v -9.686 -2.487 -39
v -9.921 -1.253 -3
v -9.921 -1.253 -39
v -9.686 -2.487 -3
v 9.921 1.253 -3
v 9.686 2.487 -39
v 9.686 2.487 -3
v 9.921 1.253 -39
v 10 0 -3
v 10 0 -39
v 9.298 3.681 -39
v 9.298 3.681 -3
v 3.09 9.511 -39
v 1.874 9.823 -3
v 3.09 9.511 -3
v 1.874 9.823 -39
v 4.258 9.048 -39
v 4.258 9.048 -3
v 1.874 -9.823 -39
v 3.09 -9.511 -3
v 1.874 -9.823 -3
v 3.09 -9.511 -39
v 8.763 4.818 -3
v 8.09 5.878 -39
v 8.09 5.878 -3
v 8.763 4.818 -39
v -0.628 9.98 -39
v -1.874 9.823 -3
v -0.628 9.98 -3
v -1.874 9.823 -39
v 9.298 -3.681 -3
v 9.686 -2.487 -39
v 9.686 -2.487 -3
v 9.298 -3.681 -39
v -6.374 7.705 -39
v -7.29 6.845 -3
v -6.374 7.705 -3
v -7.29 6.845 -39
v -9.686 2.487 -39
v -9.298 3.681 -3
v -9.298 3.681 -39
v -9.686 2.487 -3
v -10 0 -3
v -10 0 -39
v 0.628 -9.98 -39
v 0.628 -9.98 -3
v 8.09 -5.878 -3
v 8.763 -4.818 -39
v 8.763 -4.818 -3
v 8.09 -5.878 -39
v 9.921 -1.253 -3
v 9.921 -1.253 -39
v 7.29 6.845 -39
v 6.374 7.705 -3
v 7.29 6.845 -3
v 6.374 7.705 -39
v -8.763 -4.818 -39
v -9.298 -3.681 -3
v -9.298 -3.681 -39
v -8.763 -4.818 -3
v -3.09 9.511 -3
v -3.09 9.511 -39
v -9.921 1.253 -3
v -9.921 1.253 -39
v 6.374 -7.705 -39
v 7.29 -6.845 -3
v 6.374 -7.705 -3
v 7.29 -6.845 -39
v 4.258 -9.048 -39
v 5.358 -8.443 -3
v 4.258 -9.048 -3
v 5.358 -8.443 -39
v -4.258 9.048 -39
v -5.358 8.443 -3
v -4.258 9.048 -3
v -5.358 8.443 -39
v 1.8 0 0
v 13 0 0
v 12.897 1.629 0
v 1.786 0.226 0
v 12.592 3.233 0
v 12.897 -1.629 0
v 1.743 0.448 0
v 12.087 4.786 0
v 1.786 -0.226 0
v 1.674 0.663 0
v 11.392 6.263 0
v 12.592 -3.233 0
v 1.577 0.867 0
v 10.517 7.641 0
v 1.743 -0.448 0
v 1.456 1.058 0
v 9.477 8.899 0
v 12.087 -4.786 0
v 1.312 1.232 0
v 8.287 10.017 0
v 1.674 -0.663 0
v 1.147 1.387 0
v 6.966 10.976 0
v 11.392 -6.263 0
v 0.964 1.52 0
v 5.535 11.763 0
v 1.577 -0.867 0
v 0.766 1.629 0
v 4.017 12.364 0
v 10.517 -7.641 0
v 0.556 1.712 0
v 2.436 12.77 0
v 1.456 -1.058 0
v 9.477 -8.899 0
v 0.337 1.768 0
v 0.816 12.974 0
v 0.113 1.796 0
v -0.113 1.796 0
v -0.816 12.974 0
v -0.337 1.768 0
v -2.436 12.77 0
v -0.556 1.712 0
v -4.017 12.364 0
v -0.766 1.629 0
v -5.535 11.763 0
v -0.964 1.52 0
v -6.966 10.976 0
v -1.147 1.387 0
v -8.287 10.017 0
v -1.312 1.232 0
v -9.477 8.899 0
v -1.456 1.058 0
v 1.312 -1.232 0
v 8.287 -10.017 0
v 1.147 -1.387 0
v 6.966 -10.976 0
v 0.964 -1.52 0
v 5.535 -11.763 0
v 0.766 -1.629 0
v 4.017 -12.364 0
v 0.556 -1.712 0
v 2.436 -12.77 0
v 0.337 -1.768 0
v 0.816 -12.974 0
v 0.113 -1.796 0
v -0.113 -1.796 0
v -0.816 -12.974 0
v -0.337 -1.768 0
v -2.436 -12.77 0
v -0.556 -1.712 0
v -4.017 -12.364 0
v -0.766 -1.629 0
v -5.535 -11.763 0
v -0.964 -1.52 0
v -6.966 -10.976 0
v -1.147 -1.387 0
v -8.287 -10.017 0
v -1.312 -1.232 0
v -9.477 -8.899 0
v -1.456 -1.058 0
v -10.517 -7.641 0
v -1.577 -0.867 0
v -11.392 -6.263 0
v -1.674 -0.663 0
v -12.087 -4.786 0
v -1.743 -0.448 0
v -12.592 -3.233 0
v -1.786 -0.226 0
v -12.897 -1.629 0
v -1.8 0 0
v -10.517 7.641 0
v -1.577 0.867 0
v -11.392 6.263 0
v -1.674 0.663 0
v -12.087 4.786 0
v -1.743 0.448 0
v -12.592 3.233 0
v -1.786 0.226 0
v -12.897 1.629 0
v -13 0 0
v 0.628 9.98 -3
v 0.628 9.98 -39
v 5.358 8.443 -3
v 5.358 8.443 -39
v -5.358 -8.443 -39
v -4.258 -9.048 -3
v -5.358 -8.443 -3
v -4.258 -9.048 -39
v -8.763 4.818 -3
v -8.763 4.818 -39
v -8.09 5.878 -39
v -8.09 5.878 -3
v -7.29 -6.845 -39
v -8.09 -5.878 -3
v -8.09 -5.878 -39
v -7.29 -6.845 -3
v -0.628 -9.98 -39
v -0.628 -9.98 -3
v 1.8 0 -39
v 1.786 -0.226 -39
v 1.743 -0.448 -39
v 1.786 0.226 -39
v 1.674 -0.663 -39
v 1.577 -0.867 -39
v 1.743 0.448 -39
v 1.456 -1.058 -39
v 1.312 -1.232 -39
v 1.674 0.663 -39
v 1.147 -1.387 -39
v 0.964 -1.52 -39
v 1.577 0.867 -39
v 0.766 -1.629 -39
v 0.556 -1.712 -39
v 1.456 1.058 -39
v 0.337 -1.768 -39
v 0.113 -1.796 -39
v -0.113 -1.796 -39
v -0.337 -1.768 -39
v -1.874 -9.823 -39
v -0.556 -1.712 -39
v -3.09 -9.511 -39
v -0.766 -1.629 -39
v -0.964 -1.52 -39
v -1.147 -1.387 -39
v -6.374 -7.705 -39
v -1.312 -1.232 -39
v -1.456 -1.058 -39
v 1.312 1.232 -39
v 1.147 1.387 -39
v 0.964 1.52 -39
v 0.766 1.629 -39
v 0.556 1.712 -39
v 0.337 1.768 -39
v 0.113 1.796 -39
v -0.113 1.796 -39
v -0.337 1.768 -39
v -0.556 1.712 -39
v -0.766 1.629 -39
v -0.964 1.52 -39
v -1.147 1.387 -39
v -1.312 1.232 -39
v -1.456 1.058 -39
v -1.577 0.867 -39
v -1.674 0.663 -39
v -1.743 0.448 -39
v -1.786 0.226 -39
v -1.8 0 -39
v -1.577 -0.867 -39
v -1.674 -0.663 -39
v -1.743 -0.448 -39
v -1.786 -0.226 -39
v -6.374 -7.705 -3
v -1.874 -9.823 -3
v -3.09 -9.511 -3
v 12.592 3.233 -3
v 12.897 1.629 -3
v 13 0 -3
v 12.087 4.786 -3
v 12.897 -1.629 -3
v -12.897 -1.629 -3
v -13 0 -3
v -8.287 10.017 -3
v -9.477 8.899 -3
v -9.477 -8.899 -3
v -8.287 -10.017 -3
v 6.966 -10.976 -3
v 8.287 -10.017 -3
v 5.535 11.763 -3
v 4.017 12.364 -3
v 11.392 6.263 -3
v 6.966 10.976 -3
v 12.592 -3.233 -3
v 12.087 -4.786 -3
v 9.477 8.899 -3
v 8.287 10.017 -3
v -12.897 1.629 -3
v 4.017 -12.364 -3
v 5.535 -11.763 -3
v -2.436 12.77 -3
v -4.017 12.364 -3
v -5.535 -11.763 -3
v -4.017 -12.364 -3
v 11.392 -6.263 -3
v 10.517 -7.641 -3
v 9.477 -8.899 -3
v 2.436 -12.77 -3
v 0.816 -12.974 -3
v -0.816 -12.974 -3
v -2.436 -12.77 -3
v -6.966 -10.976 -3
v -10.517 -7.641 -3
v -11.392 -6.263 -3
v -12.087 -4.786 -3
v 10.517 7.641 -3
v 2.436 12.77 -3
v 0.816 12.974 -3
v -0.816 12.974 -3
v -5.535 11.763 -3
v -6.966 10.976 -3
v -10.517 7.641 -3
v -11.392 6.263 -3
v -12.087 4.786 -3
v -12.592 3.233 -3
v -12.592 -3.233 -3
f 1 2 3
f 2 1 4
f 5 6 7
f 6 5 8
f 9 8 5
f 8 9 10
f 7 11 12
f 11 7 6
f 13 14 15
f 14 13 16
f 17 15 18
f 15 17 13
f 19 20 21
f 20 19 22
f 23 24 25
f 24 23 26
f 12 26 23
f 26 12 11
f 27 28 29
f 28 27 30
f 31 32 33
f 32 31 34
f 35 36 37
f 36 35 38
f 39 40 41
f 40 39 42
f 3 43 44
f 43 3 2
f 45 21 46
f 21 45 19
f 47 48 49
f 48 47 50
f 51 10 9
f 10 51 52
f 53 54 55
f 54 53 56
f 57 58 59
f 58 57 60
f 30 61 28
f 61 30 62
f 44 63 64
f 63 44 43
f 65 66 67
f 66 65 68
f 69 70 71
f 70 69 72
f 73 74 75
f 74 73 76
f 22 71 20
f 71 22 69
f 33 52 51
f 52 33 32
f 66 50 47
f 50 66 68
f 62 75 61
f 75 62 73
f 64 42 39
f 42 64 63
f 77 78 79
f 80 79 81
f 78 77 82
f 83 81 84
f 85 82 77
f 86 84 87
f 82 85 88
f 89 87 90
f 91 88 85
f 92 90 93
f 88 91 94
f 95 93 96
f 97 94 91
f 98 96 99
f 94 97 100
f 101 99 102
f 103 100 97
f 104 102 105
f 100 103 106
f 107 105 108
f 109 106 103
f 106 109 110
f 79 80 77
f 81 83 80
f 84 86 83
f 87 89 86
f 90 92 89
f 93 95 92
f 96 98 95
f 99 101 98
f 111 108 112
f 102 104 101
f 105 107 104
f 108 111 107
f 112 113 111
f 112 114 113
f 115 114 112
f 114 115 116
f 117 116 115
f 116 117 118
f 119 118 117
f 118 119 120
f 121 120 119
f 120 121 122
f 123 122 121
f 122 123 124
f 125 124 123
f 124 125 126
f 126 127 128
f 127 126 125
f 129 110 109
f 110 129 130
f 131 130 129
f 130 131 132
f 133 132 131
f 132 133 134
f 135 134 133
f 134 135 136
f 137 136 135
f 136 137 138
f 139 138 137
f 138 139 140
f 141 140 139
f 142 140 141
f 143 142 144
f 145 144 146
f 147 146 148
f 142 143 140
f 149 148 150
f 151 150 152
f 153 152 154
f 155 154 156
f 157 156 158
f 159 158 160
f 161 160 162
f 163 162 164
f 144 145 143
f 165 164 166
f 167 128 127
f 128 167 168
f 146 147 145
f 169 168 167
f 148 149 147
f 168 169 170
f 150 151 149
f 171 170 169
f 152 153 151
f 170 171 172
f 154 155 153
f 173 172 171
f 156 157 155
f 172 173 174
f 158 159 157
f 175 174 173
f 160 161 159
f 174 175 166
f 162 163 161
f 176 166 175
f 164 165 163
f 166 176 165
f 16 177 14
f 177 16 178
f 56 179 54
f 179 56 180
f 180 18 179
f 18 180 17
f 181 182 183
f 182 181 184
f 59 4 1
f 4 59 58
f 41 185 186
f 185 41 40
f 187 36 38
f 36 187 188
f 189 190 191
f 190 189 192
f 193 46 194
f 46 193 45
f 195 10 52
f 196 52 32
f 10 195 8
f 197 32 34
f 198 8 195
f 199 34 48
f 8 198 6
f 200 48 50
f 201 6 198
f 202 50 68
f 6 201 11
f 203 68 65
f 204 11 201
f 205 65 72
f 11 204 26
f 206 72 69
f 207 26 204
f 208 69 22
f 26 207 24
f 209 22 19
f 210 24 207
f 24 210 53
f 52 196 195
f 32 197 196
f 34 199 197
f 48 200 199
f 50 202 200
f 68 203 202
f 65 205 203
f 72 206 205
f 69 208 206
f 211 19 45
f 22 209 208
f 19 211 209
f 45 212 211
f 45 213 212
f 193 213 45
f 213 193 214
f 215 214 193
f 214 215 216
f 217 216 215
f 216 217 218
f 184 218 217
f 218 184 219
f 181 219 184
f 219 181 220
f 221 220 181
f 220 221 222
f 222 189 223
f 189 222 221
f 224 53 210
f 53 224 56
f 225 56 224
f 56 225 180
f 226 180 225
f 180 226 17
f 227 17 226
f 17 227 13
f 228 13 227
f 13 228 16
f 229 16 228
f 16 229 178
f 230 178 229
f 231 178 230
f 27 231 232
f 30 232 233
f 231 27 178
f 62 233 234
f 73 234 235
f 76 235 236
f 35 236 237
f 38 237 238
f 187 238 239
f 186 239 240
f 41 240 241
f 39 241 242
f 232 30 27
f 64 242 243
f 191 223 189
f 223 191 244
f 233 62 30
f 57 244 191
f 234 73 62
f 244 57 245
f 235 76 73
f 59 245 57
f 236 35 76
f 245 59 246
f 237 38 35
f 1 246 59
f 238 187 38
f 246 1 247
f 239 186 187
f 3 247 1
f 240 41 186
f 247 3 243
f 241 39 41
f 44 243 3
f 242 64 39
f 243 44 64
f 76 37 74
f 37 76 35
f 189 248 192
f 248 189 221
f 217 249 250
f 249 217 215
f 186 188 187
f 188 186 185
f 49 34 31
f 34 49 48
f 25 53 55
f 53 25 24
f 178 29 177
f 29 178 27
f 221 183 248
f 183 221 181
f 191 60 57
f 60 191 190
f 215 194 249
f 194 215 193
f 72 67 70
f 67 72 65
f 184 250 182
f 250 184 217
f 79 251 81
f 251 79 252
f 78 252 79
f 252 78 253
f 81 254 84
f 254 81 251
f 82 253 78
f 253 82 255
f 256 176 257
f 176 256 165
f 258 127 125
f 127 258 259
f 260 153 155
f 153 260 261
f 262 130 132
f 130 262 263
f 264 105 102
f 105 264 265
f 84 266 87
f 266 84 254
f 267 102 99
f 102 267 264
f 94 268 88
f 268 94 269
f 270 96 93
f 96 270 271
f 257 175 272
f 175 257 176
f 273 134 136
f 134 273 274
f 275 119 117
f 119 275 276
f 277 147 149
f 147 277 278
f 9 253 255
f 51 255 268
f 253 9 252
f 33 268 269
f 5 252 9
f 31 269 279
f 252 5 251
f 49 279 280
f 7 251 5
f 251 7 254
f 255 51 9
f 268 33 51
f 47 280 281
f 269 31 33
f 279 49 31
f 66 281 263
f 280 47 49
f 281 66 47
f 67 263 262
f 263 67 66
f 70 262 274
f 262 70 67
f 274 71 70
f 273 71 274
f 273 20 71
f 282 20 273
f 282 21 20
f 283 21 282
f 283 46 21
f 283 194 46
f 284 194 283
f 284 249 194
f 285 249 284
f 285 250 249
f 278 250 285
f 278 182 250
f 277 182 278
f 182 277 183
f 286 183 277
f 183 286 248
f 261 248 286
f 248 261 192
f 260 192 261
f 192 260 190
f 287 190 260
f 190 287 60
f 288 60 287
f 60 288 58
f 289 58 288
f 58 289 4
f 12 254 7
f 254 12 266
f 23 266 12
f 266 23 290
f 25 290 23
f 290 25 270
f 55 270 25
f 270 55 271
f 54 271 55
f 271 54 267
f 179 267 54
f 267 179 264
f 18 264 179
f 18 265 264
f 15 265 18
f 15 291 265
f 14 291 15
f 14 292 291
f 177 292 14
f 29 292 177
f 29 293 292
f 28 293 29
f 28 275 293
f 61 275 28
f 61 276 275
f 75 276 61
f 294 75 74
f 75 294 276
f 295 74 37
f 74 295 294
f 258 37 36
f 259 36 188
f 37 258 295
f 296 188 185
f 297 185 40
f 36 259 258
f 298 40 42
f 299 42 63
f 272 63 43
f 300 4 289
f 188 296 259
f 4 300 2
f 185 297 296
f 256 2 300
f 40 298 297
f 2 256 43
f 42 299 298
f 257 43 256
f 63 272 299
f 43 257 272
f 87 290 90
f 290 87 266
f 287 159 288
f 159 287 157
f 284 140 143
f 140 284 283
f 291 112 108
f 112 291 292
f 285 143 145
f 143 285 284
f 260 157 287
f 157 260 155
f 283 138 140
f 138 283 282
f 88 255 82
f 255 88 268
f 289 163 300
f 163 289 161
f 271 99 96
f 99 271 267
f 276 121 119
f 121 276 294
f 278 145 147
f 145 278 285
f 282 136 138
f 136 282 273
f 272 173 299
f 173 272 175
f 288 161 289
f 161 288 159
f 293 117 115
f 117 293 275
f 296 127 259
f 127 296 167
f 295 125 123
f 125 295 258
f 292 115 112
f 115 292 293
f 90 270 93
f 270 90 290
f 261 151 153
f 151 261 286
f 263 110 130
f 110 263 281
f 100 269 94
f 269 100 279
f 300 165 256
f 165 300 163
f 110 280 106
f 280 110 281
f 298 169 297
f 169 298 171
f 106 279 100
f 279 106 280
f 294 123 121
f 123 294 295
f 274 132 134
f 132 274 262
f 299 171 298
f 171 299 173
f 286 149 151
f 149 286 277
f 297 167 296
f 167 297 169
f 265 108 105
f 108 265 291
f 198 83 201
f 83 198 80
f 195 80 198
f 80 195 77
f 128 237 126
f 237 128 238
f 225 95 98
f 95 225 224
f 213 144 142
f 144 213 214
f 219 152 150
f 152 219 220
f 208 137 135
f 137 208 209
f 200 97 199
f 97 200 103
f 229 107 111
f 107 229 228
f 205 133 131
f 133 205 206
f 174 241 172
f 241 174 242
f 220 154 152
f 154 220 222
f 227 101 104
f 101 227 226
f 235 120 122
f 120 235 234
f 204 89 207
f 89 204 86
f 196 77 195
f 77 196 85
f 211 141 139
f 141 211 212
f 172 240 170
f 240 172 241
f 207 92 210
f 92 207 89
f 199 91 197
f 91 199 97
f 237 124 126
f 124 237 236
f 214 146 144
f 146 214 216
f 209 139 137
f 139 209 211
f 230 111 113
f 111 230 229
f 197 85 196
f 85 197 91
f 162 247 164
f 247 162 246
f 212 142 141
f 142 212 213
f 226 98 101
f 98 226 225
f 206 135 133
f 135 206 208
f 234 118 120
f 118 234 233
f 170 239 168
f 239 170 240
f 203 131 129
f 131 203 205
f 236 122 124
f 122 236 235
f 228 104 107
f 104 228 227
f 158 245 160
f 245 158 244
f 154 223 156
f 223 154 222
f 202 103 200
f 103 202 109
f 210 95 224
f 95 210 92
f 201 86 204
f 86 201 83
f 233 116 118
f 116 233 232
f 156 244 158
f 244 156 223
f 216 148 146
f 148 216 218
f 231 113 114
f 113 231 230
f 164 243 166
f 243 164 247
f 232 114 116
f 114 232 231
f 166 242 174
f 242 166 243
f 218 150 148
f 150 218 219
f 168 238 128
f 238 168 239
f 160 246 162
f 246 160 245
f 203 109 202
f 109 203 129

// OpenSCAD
$fn = 50;


difference() {
	union() {
		translate(v = [0, 0, -39.0000000000]) {
			cylinder(h = 39, r = 10.0000000000);
		}
		translate(v = [0, 0, -3.0000000000]) {
			cylinder(h = 3, r = 13.0000000000);
		}
	}
	union() {
		#translate(v = [0, 0, -39]) {
			cylinder(h = 39, r = 1.8000000000);
		}
	}
}
